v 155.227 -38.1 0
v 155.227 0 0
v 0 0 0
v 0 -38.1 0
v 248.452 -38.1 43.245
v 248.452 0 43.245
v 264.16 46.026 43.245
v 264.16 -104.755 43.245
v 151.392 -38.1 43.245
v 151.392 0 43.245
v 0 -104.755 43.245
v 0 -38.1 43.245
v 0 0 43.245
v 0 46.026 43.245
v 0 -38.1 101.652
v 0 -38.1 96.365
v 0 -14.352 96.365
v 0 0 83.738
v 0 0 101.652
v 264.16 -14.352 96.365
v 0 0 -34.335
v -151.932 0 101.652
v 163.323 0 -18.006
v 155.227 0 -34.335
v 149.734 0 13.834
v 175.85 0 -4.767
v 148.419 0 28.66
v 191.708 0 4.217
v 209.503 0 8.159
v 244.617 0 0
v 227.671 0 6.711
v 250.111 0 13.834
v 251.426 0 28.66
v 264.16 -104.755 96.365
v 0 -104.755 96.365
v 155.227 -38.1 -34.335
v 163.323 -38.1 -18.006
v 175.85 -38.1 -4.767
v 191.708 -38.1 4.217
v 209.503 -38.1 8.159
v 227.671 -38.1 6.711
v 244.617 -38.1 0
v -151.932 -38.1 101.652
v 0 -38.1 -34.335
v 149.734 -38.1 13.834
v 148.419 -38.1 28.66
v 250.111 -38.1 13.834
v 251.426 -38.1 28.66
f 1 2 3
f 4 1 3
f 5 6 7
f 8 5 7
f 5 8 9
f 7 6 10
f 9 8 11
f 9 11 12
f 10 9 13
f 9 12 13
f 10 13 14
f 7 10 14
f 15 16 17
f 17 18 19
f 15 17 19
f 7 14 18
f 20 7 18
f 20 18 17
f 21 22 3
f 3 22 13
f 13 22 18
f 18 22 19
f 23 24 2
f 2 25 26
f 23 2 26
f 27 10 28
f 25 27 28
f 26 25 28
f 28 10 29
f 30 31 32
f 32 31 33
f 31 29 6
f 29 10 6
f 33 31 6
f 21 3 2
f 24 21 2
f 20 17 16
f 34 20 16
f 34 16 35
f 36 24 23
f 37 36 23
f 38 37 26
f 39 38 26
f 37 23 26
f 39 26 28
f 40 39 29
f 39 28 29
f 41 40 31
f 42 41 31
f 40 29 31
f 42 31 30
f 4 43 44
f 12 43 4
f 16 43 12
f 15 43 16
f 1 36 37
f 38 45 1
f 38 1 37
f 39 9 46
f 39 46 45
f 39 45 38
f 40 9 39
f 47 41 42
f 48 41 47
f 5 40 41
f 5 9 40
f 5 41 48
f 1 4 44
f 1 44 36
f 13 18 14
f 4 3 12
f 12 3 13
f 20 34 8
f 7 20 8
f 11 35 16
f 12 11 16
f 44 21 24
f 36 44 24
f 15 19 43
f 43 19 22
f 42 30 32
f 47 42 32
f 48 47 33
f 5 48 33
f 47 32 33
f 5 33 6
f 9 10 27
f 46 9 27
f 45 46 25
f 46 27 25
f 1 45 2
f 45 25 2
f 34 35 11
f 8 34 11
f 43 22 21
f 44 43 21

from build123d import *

# Parameters (mm, degrees)
F1_DEPTH = 38.1
F3_DEPTH = 264.16


with BuildPart() as f1:
    # F0 (on Front) → F1 (new body)
    with BuildSketch(Plane.XZ):
        with BuildLine():
            Line((0, 101.651832), (-151.931614, 101.651832))
            Line((-151.931614, 101.651832), (0, -34.334853))
            Line((0, -34.334853), (155.22711, -34.334853))
            ThreePointArc((155.22711, -34.334853), (191.708041, 4.217474), (244.616956, 0))
            ThreePointArc((244.616956, 0), (199.922033, 77.341867), (155.22711, 0))
            Line((155.22711, 0), (0, 0))
            Line((0, 0), (0, 101.651832))
        make_face()
    extrude(amount=F1_DEPTH)

    # F2 (on Right) → F3 (join)
    with BuildSketch(Plane.YZ):
        Polygon((-14.352266, 96.364982), (-104.755044, 96.364982), (-104.755044, 43.245103), (46.02623, 43.245103), align=None)
    extrude(amount=F3_DEPTH)


solid = f1.part
